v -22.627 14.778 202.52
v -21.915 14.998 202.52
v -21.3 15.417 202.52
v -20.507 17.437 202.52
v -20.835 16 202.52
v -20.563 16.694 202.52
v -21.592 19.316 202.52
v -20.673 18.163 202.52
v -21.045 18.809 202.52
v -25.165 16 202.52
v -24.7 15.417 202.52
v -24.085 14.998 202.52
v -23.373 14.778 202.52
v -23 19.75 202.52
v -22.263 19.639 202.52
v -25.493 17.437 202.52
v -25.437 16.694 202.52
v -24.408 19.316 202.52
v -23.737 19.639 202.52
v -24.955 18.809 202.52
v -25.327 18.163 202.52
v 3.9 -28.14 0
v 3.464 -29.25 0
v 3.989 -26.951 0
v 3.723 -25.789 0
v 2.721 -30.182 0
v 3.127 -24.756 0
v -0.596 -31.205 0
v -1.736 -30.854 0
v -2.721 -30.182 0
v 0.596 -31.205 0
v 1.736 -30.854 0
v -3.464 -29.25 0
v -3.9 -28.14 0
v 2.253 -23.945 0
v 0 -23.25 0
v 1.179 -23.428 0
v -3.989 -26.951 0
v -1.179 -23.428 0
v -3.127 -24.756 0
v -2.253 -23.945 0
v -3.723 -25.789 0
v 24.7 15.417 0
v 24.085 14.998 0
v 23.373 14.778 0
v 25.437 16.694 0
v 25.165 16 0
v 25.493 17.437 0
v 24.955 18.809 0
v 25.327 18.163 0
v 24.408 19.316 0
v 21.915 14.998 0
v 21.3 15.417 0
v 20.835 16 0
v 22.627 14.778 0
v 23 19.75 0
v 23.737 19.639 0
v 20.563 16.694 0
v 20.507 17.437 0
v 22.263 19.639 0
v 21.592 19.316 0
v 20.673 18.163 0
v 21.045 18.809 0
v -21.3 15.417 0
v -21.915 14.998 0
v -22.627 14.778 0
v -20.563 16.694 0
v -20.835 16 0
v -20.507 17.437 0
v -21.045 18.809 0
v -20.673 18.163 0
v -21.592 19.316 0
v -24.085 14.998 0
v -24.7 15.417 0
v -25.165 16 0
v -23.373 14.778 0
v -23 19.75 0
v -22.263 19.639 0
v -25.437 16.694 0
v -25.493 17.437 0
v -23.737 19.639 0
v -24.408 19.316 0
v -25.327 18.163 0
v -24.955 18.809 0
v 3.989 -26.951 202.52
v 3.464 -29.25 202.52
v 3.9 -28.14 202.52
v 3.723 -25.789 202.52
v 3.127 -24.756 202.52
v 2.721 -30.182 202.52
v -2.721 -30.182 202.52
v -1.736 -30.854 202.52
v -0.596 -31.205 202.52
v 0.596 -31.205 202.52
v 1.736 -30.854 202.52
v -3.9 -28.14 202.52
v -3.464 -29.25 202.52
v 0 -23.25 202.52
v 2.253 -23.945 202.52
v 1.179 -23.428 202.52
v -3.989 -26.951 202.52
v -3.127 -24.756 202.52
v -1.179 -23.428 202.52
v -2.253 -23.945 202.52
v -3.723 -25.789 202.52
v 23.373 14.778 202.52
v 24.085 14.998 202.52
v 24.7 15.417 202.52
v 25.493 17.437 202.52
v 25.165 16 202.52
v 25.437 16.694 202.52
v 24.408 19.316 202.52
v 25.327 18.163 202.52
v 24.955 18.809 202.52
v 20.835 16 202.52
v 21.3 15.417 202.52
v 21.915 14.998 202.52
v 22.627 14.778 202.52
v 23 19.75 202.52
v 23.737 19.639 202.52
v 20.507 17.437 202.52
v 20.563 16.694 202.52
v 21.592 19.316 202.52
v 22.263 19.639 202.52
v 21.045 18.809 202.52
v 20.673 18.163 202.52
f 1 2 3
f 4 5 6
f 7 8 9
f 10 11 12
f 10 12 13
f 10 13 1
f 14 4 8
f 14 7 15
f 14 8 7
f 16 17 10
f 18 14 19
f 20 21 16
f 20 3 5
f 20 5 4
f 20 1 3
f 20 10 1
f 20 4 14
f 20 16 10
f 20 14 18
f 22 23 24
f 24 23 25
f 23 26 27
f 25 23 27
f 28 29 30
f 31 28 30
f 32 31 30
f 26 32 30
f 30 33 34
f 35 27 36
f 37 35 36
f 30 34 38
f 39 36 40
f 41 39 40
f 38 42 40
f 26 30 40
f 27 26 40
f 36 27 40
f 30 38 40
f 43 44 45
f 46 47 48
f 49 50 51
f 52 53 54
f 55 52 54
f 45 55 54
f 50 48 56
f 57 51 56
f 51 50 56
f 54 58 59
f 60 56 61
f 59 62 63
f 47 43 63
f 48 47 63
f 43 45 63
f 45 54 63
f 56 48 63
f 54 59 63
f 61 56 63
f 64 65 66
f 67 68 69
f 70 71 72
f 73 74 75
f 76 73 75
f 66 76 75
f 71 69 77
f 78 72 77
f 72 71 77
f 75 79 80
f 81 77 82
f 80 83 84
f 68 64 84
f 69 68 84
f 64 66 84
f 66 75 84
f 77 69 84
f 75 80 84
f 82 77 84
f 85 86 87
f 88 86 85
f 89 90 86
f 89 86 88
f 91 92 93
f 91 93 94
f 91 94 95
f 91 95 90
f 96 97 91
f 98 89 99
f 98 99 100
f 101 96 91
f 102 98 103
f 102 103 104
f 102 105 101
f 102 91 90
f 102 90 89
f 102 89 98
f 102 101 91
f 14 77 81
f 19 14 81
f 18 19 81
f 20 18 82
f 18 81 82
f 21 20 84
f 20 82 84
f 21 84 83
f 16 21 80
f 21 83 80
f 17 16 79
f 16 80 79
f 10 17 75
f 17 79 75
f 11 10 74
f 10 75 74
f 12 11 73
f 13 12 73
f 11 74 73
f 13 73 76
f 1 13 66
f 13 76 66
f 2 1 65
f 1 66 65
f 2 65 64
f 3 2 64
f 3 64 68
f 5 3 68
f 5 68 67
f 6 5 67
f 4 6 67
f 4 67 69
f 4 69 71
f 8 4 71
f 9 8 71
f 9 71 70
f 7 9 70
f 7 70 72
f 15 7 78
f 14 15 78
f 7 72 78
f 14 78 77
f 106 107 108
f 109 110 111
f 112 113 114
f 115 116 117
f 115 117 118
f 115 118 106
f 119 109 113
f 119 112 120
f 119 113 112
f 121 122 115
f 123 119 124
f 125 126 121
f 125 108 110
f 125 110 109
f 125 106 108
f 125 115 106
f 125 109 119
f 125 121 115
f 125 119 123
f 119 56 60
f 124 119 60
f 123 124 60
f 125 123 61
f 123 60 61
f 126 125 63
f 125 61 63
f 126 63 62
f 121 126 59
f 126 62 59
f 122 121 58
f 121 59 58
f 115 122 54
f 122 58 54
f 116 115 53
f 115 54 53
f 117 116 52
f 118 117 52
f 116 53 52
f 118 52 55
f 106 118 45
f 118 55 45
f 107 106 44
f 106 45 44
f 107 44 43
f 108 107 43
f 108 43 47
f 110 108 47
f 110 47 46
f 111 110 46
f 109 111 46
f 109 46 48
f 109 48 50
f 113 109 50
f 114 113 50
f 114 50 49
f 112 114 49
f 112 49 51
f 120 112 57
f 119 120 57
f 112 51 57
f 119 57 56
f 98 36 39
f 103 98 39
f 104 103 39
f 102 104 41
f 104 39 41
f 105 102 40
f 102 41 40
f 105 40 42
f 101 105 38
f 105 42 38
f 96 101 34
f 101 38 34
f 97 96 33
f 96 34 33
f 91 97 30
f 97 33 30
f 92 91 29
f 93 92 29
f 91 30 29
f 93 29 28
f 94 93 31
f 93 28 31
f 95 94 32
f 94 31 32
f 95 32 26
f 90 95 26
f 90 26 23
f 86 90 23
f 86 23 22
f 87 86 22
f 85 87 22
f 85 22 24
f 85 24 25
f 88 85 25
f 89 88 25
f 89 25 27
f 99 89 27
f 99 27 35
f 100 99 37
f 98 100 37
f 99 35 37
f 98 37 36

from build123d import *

# Parameters (mm, degrees)
BINDER_R      = 4
BINDER_R_2    = 2.5
EXTRUDE_DEPTH = 202.52


with BuildPart() as part:
    # Binder → Extrude (new body)
    with BuildSketch(Plane(origin=(0, -27.25, 0), x_dir=(0, 1, 0), z_dir=(0, 0, 1))):
        Circle(BINDER_R)
        with Locations((44.499998, 23.000001)):
            Circle(BINDER_R_2)
        with Locations((44.50001, -22.999993)):
            Circle(BINDER_R_2)
    extrude(amount=EXTRUDE_DEPTH)


solid = part.part
